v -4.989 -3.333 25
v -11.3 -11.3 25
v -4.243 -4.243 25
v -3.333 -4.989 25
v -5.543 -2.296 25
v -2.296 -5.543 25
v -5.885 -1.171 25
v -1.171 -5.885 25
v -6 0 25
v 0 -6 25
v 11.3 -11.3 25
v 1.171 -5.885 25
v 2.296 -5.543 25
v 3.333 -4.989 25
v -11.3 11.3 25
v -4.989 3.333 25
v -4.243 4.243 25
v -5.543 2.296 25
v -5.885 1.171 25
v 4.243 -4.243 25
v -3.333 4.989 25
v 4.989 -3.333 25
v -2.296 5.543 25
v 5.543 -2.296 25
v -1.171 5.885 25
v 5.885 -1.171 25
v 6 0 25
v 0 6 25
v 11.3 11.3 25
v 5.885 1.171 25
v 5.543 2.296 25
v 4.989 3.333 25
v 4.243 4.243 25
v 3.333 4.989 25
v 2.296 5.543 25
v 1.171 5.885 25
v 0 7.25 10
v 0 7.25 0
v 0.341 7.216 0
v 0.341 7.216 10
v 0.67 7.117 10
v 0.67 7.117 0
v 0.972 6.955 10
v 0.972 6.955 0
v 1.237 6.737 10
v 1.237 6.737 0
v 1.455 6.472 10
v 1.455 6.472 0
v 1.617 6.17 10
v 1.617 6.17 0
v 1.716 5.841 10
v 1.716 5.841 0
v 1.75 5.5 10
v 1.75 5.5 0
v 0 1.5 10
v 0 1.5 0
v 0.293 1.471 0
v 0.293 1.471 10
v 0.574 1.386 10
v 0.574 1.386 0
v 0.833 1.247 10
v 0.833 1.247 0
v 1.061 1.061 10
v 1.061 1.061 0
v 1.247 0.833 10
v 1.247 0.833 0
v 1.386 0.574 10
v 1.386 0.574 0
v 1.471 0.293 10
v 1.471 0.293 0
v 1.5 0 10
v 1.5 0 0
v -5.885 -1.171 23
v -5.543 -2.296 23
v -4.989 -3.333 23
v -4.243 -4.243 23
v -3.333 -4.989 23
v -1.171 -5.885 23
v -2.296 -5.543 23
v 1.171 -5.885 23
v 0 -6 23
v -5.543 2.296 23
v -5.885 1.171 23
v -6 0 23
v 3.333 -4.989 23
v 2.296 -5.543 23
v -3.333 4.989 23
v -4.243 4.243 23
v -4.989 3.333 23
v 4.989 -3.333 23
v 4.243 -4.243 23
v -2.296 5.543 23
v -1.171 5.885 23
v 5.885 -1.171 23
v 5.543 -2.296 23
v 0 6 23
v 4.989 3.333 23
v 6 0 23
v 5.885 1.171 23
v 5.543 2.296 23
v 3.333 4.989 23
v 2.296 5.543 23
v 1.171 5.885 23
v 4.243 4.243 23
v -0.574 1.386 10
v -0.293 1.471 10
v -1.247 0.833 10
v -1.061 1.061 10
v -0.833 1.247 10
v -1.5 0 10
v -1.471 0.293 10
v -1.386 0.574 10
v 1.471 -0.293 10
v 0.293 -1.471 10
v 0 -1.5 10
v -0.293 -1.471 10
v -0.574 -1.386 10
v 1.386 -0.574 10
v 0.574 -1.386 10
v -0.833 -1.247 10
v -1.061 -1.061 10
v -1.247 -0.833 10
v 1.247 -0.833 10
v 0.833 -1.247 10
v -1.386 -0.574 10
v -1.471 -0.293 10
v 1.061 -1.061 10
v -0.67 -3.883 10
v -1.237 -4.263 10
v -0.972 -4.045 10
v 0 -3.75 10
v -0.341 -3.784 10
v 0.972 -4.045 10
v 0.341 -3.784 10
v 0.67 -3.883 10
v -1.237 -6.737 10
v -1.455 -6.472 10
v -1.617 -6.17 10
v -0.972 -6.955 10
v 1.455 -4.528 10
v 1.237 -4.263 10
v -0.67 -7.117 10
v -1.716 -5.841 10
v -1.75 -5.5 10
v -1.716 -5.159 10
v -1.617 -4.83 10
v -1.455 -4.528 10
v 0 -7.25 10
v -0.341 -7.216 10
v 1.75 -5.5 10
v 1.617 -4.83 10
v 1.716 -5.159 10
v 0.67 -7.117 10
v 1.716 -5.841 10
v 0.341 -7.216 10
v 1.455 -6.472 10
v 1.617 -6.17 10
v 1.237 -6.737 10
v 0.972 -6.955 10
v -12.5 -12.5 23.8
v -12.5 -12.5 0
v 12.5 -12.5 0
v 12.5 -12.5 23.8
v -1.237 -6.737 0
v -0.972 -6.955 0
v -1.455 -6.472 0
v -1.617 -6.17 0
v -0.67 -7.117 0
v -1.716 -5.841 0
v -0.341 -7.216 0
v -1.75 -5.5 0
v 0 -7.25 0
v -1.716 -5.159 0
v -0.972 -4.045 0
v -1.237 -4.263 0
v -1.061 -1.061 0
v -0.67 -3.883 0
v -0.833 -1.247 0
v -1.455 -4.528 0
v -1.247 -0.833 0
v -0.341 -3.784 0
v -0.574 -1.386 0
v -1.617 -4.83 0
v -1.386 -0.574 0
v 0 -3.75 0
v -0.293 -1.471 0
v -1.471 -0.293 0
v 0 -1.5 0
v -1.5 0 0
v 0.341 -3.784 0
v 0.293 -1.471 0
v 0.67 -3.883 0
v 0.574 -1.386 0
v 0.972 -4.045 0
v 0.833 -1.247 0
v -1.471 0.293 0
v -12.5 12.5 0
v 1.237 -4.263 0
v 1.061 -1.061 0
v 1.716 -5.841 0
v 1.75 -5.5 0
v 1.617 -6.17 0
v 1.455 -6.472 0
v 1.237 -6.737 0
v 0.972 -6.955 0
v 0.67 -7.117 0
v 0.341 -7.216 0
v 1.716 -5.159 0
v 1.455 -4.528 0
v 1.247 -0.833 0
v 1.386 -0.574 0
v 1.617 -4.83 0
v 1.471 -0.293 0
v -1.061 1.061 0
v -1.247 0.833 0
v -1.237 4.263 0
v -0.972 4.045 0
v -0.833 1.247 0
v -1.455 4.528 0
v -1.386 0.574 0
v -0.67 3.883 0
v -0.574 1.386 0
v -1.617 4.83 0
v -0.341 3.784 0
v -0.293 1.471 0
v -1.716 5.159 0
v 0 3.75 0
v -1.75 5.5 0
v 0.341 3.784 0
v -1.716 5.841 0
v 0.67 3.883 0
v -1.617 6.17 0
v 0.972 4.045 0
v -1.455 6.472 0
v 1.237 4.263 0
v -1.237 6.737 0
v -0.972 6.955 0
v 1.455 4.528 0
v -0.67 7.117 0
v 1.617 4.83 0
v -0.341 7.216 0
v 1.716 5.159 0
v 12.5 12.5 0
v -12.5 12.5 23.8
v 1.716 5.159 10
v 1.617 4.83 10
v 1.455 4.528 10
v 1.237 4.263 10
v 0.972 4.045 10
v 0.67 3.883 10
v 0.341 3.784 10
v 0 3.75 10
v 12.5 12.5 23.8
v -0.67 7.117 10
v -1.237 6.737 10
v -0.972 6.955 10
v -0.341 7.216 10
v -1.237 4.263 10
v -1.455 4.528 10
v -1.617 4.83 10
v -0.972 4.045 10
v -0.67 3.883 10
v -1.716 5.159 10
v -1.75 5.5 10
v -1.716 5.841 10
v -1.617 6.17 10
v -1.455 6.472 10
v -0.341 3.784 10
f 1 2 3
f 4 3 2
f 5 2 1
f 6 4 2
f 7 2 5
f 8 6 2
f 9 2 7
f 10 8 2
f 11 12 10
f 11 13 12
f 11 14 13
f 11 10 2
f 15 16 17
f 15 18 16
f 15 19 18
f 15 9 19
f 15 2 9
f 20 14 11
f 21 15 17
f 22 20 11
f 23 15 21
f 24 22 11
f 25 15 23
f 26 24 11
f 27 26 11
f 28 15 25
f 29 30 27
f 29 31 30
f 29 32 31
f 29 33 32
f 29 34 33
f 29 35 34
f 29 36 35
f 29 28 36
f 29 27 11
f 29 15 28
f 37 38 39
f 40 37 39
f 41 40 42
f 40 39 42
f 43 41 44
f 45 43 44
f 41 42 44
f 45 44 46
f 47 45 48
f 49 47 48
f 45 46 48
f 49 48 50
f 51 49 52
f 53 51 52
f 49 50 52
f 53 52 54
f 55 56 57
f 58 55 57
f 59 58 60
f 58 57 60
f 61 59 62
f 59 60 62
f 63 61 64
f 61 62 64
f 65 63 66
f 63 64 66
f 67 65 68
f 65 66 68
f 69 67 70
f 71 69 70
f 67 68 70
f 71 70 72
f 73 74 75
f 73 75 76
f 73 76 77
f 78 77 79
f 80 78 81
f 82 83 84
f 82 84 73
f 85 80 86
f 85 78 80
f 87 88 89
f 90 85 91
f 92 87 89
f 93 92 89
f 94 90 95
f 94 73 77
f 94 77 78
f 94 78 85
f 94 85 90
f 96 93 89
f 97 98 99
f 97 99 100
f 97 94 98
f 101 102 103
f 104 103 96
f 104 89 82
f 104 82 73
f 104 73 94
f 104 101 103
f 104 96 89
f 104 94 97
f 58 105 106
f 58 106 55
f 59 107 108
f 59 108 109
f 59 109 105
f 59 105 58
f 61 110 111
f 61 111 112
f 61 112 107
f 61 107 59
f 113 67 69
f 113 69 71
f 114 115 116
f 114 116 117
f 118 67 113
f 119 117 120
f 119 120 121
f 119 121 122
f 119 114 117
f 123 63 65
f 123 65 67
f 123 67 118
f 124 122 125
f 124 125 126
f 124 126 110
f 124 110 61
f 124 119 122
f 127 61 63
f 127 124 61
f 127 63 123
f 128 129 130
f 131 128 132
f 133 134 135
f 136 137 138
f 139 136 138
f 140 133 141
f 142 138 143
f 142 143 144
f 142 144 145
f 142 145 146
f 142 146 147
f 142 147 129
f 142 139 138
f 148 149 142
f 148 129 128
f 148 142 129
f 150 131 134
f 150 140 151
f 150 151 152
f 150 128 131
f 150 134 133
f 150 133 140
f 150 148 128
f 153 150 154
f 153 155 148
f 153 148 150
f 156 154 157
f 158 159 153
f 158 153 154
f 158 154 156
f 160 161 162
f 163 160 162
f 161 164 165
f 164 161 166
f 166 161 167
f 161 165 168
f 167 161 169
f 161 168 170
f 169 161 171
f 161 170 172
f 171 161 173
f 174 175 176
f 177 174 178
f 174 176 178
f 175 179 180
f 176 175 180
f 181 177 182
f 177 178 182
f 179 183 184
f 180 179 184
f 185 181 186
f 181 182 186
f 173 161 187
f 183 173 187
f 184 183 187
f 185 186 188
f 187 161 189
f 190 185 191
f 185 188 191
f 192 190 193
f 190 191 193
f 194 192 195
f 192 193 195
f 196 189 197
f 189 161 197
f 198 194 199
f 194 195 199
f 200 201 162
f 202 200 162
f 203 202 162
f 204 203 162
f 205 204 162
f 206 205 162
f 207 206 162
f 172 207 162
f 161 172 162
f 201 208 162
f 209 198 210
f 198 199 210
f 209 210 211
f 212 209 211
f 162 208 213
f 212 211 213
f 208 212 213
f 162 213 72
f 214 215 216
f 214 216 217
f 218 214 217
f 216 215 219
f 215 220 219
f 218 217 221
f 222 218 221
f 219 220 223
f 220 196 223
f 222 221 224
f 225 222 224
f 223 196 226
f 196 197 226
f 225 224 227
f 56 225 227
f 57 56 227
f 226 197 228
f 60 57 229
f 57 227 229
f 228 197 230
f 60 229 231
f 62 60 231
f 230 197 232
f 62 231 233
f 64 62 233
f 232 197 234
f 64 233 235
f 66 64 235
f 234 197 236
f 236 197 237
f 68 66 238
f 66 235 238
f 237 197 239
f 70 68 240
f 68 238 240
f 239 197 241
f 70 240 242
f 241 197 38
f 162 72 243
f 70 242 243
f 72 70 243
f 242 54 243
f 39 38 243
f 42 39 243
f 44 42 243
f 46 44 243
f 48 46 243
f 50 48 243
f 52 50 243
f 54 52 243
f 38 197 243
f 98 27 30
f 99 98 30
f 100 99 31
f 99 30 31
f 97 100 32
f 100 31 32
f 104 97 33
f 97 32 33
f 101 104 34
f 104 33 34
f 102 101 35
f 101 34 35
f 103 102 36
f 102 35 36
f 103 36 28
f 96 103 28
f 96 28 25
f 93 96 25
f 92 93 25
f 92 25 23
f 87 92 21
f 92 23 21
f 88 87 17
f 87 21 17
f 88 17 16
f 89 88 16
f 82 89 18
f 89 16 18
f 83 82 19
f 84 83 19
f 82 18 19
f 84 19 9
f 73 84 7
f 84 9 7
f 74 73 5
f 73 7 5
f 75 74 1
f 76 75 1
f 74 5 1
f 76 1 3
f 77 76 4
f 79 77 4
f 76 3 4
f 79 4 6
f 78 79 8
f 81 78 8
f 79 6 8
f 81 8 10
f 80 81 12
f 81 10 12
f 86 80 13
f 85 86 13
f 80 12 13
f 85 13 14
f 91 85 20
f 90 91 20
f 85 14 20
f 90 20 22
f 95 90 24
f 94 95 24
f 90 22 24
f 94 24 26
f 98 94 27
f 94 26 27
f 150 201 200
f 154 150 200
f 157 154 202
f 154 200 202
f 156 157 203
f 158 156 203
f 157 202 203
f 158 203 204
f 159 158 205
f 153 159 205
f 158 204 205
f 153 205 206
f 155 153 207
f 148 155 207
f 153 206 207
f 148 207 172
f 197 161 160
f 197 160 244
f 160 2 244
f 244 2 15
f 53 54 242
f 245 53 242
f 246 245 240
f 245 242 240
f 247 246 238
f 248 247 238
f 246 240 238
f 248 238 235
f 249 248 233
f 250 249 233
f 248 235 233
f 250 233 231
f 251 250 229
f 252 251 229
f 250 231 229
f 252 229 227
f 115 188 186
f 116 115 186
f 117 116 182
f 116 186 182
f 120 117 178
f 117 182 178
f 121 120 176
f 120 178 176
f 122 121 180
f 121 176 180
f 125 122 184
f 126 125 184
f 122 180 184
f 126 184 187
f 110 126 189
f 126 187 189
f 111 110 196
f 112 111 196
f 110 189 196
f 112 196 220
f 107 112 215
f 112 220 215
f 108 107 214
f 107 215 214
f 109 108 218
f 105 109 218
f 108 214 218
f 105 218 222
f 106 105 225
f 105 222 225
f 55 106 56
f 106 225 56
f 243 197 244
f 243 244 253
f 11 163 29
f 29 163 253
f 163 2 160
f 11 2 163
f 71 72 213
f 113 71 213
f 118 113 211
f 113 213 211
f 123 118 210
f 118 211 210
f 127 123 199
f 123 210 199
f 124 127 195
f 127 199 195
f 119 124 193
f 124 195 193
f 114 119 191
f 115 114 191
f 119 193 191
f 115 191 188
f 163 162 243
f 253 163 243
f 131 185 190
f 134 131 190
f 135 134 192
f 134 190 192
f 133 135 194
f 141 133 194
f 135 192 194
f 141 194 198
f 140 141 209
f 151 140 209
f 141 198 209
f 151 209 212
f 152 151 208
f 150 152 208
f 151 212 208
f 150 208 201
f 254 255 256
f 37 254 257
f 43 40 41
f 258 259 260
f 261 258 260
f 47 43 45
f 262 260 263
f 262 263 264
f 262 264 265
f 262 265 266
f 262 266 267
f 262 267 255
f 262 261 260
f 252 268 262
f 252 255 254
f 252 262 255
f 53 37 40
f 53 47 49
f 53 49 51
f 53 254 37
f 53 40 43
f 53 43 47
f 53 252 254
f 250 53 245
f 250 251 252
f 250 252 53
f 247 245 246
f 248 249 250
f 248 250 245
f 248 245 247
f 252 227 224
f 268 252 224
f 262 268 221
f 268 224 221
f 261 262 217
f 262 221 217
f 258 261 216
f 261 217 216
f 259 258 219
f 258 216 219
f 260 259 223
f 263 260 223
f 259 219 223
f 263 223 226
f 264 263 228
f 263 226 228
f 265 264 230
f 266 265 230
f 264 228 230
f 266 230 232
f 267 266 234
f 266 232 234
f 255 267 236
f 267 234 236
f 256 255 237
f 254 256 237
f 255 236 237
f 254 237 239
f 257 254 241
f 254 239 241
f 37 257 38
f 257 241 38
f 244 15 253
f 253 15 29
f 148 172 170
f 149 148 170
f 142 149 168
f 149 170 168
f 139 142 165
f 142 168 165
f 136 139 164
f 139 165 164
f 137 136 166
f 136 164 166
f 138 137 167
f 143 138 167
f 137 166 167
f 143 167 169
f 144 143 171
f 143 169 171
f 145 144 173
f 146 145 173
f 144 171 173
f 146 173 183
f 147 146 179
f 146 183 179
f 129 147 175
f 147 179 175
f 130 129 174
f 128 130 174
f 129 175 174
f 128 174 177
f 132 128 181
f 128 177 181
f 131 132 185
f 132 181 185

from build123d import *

# Parameters (mm, degrees)
F0_W     = 25
F0_H     = 25
F1_DEPTH = 25
F2_R     = 6
F3_DEPTH = 2
F5_DEPTH = 10
F6_SIZE  = 1.2


with BuildPart() as f1:
    # F0 (on Top) → F1 (new body)
    with BuildSketch(Plane.XY):
        Rectangle(F0_W, F0_H)
    extrude(amount=F1_DEPTH)

    # F2 (on face) → F3 (cut)
    with BuildSketch(Plane.XY.offset(25)):
        Circle(F2_R)
    extrude(amount=-F3_DEPTH, mode=Mode.SUBTRACT)

    # F4 (on face) → F5 (cut)
    with BuildSketch(Plane(origin=(0, 0, 0), x_dir=(1, 0, 0), z_dir=(0, 0, -1))):
        with BuildLine():
            ThreePointArc((0, -3.75), (-1.75, -5.5), (0, -7.25))
            Line((0, -7.25), (0, -3.75))
        make_face()
        with BuildLine():
            ThreePointArc((0, 7.25), (-1.75, 5.5), (0, 3.75))
            Line((0, 3.75), (0, 7.25))
        make_face()
        with BuildLine():
            Line((0, 7.25), (0, 3.75))
            ThreePointArc((0, 3.75), (1.237437, 4.262563), (1.75, 5.5))
            ThreePointArc((1.75, 5.5), (1.237437, 6.737437), (0, 7.25))
        make_face()
        with BuildLine():
            ThreePointArc((0, 1.5), (-1.5, 0), (0, -1.5))
            Line((0, -1.5), (0, 1.5))
        make_face()
        with BuildLine():
            Line((0, 1.5), (0, -1.5))
            ThreePointArc((0, -1.5), (1.06066, -1.06066), (1.5, 0))
            ThreePointArc((1.5, 0), (1.06066, 1.06066), (0, 1.5))
        make_face()
        with BuildLine():
            Line((0, -3.75), (0, -7.25))
            ThreePointArc((0, -7.25), (1.237437, -6.737437), (1.75, -5.5))
            ThreePointArc((1.75, -5.5), (1.237437, -4.262563), (0, -3.75))
        make_face()
    extrude(amount=-F5_DEPTH, mode=Mode.SUBTRACT)

    # F6
    f6_edges = [f1.edges().sort_by_distance(p)[0] for p in [
        (0, 12.5, 25),
        (-12.5, 0, 25),
        (0, -12.5, 25),
        (12.5, 0, 25),
    ]]
    chamfer(f6_edges, length=F6_SIZE)


solid = f1.part
